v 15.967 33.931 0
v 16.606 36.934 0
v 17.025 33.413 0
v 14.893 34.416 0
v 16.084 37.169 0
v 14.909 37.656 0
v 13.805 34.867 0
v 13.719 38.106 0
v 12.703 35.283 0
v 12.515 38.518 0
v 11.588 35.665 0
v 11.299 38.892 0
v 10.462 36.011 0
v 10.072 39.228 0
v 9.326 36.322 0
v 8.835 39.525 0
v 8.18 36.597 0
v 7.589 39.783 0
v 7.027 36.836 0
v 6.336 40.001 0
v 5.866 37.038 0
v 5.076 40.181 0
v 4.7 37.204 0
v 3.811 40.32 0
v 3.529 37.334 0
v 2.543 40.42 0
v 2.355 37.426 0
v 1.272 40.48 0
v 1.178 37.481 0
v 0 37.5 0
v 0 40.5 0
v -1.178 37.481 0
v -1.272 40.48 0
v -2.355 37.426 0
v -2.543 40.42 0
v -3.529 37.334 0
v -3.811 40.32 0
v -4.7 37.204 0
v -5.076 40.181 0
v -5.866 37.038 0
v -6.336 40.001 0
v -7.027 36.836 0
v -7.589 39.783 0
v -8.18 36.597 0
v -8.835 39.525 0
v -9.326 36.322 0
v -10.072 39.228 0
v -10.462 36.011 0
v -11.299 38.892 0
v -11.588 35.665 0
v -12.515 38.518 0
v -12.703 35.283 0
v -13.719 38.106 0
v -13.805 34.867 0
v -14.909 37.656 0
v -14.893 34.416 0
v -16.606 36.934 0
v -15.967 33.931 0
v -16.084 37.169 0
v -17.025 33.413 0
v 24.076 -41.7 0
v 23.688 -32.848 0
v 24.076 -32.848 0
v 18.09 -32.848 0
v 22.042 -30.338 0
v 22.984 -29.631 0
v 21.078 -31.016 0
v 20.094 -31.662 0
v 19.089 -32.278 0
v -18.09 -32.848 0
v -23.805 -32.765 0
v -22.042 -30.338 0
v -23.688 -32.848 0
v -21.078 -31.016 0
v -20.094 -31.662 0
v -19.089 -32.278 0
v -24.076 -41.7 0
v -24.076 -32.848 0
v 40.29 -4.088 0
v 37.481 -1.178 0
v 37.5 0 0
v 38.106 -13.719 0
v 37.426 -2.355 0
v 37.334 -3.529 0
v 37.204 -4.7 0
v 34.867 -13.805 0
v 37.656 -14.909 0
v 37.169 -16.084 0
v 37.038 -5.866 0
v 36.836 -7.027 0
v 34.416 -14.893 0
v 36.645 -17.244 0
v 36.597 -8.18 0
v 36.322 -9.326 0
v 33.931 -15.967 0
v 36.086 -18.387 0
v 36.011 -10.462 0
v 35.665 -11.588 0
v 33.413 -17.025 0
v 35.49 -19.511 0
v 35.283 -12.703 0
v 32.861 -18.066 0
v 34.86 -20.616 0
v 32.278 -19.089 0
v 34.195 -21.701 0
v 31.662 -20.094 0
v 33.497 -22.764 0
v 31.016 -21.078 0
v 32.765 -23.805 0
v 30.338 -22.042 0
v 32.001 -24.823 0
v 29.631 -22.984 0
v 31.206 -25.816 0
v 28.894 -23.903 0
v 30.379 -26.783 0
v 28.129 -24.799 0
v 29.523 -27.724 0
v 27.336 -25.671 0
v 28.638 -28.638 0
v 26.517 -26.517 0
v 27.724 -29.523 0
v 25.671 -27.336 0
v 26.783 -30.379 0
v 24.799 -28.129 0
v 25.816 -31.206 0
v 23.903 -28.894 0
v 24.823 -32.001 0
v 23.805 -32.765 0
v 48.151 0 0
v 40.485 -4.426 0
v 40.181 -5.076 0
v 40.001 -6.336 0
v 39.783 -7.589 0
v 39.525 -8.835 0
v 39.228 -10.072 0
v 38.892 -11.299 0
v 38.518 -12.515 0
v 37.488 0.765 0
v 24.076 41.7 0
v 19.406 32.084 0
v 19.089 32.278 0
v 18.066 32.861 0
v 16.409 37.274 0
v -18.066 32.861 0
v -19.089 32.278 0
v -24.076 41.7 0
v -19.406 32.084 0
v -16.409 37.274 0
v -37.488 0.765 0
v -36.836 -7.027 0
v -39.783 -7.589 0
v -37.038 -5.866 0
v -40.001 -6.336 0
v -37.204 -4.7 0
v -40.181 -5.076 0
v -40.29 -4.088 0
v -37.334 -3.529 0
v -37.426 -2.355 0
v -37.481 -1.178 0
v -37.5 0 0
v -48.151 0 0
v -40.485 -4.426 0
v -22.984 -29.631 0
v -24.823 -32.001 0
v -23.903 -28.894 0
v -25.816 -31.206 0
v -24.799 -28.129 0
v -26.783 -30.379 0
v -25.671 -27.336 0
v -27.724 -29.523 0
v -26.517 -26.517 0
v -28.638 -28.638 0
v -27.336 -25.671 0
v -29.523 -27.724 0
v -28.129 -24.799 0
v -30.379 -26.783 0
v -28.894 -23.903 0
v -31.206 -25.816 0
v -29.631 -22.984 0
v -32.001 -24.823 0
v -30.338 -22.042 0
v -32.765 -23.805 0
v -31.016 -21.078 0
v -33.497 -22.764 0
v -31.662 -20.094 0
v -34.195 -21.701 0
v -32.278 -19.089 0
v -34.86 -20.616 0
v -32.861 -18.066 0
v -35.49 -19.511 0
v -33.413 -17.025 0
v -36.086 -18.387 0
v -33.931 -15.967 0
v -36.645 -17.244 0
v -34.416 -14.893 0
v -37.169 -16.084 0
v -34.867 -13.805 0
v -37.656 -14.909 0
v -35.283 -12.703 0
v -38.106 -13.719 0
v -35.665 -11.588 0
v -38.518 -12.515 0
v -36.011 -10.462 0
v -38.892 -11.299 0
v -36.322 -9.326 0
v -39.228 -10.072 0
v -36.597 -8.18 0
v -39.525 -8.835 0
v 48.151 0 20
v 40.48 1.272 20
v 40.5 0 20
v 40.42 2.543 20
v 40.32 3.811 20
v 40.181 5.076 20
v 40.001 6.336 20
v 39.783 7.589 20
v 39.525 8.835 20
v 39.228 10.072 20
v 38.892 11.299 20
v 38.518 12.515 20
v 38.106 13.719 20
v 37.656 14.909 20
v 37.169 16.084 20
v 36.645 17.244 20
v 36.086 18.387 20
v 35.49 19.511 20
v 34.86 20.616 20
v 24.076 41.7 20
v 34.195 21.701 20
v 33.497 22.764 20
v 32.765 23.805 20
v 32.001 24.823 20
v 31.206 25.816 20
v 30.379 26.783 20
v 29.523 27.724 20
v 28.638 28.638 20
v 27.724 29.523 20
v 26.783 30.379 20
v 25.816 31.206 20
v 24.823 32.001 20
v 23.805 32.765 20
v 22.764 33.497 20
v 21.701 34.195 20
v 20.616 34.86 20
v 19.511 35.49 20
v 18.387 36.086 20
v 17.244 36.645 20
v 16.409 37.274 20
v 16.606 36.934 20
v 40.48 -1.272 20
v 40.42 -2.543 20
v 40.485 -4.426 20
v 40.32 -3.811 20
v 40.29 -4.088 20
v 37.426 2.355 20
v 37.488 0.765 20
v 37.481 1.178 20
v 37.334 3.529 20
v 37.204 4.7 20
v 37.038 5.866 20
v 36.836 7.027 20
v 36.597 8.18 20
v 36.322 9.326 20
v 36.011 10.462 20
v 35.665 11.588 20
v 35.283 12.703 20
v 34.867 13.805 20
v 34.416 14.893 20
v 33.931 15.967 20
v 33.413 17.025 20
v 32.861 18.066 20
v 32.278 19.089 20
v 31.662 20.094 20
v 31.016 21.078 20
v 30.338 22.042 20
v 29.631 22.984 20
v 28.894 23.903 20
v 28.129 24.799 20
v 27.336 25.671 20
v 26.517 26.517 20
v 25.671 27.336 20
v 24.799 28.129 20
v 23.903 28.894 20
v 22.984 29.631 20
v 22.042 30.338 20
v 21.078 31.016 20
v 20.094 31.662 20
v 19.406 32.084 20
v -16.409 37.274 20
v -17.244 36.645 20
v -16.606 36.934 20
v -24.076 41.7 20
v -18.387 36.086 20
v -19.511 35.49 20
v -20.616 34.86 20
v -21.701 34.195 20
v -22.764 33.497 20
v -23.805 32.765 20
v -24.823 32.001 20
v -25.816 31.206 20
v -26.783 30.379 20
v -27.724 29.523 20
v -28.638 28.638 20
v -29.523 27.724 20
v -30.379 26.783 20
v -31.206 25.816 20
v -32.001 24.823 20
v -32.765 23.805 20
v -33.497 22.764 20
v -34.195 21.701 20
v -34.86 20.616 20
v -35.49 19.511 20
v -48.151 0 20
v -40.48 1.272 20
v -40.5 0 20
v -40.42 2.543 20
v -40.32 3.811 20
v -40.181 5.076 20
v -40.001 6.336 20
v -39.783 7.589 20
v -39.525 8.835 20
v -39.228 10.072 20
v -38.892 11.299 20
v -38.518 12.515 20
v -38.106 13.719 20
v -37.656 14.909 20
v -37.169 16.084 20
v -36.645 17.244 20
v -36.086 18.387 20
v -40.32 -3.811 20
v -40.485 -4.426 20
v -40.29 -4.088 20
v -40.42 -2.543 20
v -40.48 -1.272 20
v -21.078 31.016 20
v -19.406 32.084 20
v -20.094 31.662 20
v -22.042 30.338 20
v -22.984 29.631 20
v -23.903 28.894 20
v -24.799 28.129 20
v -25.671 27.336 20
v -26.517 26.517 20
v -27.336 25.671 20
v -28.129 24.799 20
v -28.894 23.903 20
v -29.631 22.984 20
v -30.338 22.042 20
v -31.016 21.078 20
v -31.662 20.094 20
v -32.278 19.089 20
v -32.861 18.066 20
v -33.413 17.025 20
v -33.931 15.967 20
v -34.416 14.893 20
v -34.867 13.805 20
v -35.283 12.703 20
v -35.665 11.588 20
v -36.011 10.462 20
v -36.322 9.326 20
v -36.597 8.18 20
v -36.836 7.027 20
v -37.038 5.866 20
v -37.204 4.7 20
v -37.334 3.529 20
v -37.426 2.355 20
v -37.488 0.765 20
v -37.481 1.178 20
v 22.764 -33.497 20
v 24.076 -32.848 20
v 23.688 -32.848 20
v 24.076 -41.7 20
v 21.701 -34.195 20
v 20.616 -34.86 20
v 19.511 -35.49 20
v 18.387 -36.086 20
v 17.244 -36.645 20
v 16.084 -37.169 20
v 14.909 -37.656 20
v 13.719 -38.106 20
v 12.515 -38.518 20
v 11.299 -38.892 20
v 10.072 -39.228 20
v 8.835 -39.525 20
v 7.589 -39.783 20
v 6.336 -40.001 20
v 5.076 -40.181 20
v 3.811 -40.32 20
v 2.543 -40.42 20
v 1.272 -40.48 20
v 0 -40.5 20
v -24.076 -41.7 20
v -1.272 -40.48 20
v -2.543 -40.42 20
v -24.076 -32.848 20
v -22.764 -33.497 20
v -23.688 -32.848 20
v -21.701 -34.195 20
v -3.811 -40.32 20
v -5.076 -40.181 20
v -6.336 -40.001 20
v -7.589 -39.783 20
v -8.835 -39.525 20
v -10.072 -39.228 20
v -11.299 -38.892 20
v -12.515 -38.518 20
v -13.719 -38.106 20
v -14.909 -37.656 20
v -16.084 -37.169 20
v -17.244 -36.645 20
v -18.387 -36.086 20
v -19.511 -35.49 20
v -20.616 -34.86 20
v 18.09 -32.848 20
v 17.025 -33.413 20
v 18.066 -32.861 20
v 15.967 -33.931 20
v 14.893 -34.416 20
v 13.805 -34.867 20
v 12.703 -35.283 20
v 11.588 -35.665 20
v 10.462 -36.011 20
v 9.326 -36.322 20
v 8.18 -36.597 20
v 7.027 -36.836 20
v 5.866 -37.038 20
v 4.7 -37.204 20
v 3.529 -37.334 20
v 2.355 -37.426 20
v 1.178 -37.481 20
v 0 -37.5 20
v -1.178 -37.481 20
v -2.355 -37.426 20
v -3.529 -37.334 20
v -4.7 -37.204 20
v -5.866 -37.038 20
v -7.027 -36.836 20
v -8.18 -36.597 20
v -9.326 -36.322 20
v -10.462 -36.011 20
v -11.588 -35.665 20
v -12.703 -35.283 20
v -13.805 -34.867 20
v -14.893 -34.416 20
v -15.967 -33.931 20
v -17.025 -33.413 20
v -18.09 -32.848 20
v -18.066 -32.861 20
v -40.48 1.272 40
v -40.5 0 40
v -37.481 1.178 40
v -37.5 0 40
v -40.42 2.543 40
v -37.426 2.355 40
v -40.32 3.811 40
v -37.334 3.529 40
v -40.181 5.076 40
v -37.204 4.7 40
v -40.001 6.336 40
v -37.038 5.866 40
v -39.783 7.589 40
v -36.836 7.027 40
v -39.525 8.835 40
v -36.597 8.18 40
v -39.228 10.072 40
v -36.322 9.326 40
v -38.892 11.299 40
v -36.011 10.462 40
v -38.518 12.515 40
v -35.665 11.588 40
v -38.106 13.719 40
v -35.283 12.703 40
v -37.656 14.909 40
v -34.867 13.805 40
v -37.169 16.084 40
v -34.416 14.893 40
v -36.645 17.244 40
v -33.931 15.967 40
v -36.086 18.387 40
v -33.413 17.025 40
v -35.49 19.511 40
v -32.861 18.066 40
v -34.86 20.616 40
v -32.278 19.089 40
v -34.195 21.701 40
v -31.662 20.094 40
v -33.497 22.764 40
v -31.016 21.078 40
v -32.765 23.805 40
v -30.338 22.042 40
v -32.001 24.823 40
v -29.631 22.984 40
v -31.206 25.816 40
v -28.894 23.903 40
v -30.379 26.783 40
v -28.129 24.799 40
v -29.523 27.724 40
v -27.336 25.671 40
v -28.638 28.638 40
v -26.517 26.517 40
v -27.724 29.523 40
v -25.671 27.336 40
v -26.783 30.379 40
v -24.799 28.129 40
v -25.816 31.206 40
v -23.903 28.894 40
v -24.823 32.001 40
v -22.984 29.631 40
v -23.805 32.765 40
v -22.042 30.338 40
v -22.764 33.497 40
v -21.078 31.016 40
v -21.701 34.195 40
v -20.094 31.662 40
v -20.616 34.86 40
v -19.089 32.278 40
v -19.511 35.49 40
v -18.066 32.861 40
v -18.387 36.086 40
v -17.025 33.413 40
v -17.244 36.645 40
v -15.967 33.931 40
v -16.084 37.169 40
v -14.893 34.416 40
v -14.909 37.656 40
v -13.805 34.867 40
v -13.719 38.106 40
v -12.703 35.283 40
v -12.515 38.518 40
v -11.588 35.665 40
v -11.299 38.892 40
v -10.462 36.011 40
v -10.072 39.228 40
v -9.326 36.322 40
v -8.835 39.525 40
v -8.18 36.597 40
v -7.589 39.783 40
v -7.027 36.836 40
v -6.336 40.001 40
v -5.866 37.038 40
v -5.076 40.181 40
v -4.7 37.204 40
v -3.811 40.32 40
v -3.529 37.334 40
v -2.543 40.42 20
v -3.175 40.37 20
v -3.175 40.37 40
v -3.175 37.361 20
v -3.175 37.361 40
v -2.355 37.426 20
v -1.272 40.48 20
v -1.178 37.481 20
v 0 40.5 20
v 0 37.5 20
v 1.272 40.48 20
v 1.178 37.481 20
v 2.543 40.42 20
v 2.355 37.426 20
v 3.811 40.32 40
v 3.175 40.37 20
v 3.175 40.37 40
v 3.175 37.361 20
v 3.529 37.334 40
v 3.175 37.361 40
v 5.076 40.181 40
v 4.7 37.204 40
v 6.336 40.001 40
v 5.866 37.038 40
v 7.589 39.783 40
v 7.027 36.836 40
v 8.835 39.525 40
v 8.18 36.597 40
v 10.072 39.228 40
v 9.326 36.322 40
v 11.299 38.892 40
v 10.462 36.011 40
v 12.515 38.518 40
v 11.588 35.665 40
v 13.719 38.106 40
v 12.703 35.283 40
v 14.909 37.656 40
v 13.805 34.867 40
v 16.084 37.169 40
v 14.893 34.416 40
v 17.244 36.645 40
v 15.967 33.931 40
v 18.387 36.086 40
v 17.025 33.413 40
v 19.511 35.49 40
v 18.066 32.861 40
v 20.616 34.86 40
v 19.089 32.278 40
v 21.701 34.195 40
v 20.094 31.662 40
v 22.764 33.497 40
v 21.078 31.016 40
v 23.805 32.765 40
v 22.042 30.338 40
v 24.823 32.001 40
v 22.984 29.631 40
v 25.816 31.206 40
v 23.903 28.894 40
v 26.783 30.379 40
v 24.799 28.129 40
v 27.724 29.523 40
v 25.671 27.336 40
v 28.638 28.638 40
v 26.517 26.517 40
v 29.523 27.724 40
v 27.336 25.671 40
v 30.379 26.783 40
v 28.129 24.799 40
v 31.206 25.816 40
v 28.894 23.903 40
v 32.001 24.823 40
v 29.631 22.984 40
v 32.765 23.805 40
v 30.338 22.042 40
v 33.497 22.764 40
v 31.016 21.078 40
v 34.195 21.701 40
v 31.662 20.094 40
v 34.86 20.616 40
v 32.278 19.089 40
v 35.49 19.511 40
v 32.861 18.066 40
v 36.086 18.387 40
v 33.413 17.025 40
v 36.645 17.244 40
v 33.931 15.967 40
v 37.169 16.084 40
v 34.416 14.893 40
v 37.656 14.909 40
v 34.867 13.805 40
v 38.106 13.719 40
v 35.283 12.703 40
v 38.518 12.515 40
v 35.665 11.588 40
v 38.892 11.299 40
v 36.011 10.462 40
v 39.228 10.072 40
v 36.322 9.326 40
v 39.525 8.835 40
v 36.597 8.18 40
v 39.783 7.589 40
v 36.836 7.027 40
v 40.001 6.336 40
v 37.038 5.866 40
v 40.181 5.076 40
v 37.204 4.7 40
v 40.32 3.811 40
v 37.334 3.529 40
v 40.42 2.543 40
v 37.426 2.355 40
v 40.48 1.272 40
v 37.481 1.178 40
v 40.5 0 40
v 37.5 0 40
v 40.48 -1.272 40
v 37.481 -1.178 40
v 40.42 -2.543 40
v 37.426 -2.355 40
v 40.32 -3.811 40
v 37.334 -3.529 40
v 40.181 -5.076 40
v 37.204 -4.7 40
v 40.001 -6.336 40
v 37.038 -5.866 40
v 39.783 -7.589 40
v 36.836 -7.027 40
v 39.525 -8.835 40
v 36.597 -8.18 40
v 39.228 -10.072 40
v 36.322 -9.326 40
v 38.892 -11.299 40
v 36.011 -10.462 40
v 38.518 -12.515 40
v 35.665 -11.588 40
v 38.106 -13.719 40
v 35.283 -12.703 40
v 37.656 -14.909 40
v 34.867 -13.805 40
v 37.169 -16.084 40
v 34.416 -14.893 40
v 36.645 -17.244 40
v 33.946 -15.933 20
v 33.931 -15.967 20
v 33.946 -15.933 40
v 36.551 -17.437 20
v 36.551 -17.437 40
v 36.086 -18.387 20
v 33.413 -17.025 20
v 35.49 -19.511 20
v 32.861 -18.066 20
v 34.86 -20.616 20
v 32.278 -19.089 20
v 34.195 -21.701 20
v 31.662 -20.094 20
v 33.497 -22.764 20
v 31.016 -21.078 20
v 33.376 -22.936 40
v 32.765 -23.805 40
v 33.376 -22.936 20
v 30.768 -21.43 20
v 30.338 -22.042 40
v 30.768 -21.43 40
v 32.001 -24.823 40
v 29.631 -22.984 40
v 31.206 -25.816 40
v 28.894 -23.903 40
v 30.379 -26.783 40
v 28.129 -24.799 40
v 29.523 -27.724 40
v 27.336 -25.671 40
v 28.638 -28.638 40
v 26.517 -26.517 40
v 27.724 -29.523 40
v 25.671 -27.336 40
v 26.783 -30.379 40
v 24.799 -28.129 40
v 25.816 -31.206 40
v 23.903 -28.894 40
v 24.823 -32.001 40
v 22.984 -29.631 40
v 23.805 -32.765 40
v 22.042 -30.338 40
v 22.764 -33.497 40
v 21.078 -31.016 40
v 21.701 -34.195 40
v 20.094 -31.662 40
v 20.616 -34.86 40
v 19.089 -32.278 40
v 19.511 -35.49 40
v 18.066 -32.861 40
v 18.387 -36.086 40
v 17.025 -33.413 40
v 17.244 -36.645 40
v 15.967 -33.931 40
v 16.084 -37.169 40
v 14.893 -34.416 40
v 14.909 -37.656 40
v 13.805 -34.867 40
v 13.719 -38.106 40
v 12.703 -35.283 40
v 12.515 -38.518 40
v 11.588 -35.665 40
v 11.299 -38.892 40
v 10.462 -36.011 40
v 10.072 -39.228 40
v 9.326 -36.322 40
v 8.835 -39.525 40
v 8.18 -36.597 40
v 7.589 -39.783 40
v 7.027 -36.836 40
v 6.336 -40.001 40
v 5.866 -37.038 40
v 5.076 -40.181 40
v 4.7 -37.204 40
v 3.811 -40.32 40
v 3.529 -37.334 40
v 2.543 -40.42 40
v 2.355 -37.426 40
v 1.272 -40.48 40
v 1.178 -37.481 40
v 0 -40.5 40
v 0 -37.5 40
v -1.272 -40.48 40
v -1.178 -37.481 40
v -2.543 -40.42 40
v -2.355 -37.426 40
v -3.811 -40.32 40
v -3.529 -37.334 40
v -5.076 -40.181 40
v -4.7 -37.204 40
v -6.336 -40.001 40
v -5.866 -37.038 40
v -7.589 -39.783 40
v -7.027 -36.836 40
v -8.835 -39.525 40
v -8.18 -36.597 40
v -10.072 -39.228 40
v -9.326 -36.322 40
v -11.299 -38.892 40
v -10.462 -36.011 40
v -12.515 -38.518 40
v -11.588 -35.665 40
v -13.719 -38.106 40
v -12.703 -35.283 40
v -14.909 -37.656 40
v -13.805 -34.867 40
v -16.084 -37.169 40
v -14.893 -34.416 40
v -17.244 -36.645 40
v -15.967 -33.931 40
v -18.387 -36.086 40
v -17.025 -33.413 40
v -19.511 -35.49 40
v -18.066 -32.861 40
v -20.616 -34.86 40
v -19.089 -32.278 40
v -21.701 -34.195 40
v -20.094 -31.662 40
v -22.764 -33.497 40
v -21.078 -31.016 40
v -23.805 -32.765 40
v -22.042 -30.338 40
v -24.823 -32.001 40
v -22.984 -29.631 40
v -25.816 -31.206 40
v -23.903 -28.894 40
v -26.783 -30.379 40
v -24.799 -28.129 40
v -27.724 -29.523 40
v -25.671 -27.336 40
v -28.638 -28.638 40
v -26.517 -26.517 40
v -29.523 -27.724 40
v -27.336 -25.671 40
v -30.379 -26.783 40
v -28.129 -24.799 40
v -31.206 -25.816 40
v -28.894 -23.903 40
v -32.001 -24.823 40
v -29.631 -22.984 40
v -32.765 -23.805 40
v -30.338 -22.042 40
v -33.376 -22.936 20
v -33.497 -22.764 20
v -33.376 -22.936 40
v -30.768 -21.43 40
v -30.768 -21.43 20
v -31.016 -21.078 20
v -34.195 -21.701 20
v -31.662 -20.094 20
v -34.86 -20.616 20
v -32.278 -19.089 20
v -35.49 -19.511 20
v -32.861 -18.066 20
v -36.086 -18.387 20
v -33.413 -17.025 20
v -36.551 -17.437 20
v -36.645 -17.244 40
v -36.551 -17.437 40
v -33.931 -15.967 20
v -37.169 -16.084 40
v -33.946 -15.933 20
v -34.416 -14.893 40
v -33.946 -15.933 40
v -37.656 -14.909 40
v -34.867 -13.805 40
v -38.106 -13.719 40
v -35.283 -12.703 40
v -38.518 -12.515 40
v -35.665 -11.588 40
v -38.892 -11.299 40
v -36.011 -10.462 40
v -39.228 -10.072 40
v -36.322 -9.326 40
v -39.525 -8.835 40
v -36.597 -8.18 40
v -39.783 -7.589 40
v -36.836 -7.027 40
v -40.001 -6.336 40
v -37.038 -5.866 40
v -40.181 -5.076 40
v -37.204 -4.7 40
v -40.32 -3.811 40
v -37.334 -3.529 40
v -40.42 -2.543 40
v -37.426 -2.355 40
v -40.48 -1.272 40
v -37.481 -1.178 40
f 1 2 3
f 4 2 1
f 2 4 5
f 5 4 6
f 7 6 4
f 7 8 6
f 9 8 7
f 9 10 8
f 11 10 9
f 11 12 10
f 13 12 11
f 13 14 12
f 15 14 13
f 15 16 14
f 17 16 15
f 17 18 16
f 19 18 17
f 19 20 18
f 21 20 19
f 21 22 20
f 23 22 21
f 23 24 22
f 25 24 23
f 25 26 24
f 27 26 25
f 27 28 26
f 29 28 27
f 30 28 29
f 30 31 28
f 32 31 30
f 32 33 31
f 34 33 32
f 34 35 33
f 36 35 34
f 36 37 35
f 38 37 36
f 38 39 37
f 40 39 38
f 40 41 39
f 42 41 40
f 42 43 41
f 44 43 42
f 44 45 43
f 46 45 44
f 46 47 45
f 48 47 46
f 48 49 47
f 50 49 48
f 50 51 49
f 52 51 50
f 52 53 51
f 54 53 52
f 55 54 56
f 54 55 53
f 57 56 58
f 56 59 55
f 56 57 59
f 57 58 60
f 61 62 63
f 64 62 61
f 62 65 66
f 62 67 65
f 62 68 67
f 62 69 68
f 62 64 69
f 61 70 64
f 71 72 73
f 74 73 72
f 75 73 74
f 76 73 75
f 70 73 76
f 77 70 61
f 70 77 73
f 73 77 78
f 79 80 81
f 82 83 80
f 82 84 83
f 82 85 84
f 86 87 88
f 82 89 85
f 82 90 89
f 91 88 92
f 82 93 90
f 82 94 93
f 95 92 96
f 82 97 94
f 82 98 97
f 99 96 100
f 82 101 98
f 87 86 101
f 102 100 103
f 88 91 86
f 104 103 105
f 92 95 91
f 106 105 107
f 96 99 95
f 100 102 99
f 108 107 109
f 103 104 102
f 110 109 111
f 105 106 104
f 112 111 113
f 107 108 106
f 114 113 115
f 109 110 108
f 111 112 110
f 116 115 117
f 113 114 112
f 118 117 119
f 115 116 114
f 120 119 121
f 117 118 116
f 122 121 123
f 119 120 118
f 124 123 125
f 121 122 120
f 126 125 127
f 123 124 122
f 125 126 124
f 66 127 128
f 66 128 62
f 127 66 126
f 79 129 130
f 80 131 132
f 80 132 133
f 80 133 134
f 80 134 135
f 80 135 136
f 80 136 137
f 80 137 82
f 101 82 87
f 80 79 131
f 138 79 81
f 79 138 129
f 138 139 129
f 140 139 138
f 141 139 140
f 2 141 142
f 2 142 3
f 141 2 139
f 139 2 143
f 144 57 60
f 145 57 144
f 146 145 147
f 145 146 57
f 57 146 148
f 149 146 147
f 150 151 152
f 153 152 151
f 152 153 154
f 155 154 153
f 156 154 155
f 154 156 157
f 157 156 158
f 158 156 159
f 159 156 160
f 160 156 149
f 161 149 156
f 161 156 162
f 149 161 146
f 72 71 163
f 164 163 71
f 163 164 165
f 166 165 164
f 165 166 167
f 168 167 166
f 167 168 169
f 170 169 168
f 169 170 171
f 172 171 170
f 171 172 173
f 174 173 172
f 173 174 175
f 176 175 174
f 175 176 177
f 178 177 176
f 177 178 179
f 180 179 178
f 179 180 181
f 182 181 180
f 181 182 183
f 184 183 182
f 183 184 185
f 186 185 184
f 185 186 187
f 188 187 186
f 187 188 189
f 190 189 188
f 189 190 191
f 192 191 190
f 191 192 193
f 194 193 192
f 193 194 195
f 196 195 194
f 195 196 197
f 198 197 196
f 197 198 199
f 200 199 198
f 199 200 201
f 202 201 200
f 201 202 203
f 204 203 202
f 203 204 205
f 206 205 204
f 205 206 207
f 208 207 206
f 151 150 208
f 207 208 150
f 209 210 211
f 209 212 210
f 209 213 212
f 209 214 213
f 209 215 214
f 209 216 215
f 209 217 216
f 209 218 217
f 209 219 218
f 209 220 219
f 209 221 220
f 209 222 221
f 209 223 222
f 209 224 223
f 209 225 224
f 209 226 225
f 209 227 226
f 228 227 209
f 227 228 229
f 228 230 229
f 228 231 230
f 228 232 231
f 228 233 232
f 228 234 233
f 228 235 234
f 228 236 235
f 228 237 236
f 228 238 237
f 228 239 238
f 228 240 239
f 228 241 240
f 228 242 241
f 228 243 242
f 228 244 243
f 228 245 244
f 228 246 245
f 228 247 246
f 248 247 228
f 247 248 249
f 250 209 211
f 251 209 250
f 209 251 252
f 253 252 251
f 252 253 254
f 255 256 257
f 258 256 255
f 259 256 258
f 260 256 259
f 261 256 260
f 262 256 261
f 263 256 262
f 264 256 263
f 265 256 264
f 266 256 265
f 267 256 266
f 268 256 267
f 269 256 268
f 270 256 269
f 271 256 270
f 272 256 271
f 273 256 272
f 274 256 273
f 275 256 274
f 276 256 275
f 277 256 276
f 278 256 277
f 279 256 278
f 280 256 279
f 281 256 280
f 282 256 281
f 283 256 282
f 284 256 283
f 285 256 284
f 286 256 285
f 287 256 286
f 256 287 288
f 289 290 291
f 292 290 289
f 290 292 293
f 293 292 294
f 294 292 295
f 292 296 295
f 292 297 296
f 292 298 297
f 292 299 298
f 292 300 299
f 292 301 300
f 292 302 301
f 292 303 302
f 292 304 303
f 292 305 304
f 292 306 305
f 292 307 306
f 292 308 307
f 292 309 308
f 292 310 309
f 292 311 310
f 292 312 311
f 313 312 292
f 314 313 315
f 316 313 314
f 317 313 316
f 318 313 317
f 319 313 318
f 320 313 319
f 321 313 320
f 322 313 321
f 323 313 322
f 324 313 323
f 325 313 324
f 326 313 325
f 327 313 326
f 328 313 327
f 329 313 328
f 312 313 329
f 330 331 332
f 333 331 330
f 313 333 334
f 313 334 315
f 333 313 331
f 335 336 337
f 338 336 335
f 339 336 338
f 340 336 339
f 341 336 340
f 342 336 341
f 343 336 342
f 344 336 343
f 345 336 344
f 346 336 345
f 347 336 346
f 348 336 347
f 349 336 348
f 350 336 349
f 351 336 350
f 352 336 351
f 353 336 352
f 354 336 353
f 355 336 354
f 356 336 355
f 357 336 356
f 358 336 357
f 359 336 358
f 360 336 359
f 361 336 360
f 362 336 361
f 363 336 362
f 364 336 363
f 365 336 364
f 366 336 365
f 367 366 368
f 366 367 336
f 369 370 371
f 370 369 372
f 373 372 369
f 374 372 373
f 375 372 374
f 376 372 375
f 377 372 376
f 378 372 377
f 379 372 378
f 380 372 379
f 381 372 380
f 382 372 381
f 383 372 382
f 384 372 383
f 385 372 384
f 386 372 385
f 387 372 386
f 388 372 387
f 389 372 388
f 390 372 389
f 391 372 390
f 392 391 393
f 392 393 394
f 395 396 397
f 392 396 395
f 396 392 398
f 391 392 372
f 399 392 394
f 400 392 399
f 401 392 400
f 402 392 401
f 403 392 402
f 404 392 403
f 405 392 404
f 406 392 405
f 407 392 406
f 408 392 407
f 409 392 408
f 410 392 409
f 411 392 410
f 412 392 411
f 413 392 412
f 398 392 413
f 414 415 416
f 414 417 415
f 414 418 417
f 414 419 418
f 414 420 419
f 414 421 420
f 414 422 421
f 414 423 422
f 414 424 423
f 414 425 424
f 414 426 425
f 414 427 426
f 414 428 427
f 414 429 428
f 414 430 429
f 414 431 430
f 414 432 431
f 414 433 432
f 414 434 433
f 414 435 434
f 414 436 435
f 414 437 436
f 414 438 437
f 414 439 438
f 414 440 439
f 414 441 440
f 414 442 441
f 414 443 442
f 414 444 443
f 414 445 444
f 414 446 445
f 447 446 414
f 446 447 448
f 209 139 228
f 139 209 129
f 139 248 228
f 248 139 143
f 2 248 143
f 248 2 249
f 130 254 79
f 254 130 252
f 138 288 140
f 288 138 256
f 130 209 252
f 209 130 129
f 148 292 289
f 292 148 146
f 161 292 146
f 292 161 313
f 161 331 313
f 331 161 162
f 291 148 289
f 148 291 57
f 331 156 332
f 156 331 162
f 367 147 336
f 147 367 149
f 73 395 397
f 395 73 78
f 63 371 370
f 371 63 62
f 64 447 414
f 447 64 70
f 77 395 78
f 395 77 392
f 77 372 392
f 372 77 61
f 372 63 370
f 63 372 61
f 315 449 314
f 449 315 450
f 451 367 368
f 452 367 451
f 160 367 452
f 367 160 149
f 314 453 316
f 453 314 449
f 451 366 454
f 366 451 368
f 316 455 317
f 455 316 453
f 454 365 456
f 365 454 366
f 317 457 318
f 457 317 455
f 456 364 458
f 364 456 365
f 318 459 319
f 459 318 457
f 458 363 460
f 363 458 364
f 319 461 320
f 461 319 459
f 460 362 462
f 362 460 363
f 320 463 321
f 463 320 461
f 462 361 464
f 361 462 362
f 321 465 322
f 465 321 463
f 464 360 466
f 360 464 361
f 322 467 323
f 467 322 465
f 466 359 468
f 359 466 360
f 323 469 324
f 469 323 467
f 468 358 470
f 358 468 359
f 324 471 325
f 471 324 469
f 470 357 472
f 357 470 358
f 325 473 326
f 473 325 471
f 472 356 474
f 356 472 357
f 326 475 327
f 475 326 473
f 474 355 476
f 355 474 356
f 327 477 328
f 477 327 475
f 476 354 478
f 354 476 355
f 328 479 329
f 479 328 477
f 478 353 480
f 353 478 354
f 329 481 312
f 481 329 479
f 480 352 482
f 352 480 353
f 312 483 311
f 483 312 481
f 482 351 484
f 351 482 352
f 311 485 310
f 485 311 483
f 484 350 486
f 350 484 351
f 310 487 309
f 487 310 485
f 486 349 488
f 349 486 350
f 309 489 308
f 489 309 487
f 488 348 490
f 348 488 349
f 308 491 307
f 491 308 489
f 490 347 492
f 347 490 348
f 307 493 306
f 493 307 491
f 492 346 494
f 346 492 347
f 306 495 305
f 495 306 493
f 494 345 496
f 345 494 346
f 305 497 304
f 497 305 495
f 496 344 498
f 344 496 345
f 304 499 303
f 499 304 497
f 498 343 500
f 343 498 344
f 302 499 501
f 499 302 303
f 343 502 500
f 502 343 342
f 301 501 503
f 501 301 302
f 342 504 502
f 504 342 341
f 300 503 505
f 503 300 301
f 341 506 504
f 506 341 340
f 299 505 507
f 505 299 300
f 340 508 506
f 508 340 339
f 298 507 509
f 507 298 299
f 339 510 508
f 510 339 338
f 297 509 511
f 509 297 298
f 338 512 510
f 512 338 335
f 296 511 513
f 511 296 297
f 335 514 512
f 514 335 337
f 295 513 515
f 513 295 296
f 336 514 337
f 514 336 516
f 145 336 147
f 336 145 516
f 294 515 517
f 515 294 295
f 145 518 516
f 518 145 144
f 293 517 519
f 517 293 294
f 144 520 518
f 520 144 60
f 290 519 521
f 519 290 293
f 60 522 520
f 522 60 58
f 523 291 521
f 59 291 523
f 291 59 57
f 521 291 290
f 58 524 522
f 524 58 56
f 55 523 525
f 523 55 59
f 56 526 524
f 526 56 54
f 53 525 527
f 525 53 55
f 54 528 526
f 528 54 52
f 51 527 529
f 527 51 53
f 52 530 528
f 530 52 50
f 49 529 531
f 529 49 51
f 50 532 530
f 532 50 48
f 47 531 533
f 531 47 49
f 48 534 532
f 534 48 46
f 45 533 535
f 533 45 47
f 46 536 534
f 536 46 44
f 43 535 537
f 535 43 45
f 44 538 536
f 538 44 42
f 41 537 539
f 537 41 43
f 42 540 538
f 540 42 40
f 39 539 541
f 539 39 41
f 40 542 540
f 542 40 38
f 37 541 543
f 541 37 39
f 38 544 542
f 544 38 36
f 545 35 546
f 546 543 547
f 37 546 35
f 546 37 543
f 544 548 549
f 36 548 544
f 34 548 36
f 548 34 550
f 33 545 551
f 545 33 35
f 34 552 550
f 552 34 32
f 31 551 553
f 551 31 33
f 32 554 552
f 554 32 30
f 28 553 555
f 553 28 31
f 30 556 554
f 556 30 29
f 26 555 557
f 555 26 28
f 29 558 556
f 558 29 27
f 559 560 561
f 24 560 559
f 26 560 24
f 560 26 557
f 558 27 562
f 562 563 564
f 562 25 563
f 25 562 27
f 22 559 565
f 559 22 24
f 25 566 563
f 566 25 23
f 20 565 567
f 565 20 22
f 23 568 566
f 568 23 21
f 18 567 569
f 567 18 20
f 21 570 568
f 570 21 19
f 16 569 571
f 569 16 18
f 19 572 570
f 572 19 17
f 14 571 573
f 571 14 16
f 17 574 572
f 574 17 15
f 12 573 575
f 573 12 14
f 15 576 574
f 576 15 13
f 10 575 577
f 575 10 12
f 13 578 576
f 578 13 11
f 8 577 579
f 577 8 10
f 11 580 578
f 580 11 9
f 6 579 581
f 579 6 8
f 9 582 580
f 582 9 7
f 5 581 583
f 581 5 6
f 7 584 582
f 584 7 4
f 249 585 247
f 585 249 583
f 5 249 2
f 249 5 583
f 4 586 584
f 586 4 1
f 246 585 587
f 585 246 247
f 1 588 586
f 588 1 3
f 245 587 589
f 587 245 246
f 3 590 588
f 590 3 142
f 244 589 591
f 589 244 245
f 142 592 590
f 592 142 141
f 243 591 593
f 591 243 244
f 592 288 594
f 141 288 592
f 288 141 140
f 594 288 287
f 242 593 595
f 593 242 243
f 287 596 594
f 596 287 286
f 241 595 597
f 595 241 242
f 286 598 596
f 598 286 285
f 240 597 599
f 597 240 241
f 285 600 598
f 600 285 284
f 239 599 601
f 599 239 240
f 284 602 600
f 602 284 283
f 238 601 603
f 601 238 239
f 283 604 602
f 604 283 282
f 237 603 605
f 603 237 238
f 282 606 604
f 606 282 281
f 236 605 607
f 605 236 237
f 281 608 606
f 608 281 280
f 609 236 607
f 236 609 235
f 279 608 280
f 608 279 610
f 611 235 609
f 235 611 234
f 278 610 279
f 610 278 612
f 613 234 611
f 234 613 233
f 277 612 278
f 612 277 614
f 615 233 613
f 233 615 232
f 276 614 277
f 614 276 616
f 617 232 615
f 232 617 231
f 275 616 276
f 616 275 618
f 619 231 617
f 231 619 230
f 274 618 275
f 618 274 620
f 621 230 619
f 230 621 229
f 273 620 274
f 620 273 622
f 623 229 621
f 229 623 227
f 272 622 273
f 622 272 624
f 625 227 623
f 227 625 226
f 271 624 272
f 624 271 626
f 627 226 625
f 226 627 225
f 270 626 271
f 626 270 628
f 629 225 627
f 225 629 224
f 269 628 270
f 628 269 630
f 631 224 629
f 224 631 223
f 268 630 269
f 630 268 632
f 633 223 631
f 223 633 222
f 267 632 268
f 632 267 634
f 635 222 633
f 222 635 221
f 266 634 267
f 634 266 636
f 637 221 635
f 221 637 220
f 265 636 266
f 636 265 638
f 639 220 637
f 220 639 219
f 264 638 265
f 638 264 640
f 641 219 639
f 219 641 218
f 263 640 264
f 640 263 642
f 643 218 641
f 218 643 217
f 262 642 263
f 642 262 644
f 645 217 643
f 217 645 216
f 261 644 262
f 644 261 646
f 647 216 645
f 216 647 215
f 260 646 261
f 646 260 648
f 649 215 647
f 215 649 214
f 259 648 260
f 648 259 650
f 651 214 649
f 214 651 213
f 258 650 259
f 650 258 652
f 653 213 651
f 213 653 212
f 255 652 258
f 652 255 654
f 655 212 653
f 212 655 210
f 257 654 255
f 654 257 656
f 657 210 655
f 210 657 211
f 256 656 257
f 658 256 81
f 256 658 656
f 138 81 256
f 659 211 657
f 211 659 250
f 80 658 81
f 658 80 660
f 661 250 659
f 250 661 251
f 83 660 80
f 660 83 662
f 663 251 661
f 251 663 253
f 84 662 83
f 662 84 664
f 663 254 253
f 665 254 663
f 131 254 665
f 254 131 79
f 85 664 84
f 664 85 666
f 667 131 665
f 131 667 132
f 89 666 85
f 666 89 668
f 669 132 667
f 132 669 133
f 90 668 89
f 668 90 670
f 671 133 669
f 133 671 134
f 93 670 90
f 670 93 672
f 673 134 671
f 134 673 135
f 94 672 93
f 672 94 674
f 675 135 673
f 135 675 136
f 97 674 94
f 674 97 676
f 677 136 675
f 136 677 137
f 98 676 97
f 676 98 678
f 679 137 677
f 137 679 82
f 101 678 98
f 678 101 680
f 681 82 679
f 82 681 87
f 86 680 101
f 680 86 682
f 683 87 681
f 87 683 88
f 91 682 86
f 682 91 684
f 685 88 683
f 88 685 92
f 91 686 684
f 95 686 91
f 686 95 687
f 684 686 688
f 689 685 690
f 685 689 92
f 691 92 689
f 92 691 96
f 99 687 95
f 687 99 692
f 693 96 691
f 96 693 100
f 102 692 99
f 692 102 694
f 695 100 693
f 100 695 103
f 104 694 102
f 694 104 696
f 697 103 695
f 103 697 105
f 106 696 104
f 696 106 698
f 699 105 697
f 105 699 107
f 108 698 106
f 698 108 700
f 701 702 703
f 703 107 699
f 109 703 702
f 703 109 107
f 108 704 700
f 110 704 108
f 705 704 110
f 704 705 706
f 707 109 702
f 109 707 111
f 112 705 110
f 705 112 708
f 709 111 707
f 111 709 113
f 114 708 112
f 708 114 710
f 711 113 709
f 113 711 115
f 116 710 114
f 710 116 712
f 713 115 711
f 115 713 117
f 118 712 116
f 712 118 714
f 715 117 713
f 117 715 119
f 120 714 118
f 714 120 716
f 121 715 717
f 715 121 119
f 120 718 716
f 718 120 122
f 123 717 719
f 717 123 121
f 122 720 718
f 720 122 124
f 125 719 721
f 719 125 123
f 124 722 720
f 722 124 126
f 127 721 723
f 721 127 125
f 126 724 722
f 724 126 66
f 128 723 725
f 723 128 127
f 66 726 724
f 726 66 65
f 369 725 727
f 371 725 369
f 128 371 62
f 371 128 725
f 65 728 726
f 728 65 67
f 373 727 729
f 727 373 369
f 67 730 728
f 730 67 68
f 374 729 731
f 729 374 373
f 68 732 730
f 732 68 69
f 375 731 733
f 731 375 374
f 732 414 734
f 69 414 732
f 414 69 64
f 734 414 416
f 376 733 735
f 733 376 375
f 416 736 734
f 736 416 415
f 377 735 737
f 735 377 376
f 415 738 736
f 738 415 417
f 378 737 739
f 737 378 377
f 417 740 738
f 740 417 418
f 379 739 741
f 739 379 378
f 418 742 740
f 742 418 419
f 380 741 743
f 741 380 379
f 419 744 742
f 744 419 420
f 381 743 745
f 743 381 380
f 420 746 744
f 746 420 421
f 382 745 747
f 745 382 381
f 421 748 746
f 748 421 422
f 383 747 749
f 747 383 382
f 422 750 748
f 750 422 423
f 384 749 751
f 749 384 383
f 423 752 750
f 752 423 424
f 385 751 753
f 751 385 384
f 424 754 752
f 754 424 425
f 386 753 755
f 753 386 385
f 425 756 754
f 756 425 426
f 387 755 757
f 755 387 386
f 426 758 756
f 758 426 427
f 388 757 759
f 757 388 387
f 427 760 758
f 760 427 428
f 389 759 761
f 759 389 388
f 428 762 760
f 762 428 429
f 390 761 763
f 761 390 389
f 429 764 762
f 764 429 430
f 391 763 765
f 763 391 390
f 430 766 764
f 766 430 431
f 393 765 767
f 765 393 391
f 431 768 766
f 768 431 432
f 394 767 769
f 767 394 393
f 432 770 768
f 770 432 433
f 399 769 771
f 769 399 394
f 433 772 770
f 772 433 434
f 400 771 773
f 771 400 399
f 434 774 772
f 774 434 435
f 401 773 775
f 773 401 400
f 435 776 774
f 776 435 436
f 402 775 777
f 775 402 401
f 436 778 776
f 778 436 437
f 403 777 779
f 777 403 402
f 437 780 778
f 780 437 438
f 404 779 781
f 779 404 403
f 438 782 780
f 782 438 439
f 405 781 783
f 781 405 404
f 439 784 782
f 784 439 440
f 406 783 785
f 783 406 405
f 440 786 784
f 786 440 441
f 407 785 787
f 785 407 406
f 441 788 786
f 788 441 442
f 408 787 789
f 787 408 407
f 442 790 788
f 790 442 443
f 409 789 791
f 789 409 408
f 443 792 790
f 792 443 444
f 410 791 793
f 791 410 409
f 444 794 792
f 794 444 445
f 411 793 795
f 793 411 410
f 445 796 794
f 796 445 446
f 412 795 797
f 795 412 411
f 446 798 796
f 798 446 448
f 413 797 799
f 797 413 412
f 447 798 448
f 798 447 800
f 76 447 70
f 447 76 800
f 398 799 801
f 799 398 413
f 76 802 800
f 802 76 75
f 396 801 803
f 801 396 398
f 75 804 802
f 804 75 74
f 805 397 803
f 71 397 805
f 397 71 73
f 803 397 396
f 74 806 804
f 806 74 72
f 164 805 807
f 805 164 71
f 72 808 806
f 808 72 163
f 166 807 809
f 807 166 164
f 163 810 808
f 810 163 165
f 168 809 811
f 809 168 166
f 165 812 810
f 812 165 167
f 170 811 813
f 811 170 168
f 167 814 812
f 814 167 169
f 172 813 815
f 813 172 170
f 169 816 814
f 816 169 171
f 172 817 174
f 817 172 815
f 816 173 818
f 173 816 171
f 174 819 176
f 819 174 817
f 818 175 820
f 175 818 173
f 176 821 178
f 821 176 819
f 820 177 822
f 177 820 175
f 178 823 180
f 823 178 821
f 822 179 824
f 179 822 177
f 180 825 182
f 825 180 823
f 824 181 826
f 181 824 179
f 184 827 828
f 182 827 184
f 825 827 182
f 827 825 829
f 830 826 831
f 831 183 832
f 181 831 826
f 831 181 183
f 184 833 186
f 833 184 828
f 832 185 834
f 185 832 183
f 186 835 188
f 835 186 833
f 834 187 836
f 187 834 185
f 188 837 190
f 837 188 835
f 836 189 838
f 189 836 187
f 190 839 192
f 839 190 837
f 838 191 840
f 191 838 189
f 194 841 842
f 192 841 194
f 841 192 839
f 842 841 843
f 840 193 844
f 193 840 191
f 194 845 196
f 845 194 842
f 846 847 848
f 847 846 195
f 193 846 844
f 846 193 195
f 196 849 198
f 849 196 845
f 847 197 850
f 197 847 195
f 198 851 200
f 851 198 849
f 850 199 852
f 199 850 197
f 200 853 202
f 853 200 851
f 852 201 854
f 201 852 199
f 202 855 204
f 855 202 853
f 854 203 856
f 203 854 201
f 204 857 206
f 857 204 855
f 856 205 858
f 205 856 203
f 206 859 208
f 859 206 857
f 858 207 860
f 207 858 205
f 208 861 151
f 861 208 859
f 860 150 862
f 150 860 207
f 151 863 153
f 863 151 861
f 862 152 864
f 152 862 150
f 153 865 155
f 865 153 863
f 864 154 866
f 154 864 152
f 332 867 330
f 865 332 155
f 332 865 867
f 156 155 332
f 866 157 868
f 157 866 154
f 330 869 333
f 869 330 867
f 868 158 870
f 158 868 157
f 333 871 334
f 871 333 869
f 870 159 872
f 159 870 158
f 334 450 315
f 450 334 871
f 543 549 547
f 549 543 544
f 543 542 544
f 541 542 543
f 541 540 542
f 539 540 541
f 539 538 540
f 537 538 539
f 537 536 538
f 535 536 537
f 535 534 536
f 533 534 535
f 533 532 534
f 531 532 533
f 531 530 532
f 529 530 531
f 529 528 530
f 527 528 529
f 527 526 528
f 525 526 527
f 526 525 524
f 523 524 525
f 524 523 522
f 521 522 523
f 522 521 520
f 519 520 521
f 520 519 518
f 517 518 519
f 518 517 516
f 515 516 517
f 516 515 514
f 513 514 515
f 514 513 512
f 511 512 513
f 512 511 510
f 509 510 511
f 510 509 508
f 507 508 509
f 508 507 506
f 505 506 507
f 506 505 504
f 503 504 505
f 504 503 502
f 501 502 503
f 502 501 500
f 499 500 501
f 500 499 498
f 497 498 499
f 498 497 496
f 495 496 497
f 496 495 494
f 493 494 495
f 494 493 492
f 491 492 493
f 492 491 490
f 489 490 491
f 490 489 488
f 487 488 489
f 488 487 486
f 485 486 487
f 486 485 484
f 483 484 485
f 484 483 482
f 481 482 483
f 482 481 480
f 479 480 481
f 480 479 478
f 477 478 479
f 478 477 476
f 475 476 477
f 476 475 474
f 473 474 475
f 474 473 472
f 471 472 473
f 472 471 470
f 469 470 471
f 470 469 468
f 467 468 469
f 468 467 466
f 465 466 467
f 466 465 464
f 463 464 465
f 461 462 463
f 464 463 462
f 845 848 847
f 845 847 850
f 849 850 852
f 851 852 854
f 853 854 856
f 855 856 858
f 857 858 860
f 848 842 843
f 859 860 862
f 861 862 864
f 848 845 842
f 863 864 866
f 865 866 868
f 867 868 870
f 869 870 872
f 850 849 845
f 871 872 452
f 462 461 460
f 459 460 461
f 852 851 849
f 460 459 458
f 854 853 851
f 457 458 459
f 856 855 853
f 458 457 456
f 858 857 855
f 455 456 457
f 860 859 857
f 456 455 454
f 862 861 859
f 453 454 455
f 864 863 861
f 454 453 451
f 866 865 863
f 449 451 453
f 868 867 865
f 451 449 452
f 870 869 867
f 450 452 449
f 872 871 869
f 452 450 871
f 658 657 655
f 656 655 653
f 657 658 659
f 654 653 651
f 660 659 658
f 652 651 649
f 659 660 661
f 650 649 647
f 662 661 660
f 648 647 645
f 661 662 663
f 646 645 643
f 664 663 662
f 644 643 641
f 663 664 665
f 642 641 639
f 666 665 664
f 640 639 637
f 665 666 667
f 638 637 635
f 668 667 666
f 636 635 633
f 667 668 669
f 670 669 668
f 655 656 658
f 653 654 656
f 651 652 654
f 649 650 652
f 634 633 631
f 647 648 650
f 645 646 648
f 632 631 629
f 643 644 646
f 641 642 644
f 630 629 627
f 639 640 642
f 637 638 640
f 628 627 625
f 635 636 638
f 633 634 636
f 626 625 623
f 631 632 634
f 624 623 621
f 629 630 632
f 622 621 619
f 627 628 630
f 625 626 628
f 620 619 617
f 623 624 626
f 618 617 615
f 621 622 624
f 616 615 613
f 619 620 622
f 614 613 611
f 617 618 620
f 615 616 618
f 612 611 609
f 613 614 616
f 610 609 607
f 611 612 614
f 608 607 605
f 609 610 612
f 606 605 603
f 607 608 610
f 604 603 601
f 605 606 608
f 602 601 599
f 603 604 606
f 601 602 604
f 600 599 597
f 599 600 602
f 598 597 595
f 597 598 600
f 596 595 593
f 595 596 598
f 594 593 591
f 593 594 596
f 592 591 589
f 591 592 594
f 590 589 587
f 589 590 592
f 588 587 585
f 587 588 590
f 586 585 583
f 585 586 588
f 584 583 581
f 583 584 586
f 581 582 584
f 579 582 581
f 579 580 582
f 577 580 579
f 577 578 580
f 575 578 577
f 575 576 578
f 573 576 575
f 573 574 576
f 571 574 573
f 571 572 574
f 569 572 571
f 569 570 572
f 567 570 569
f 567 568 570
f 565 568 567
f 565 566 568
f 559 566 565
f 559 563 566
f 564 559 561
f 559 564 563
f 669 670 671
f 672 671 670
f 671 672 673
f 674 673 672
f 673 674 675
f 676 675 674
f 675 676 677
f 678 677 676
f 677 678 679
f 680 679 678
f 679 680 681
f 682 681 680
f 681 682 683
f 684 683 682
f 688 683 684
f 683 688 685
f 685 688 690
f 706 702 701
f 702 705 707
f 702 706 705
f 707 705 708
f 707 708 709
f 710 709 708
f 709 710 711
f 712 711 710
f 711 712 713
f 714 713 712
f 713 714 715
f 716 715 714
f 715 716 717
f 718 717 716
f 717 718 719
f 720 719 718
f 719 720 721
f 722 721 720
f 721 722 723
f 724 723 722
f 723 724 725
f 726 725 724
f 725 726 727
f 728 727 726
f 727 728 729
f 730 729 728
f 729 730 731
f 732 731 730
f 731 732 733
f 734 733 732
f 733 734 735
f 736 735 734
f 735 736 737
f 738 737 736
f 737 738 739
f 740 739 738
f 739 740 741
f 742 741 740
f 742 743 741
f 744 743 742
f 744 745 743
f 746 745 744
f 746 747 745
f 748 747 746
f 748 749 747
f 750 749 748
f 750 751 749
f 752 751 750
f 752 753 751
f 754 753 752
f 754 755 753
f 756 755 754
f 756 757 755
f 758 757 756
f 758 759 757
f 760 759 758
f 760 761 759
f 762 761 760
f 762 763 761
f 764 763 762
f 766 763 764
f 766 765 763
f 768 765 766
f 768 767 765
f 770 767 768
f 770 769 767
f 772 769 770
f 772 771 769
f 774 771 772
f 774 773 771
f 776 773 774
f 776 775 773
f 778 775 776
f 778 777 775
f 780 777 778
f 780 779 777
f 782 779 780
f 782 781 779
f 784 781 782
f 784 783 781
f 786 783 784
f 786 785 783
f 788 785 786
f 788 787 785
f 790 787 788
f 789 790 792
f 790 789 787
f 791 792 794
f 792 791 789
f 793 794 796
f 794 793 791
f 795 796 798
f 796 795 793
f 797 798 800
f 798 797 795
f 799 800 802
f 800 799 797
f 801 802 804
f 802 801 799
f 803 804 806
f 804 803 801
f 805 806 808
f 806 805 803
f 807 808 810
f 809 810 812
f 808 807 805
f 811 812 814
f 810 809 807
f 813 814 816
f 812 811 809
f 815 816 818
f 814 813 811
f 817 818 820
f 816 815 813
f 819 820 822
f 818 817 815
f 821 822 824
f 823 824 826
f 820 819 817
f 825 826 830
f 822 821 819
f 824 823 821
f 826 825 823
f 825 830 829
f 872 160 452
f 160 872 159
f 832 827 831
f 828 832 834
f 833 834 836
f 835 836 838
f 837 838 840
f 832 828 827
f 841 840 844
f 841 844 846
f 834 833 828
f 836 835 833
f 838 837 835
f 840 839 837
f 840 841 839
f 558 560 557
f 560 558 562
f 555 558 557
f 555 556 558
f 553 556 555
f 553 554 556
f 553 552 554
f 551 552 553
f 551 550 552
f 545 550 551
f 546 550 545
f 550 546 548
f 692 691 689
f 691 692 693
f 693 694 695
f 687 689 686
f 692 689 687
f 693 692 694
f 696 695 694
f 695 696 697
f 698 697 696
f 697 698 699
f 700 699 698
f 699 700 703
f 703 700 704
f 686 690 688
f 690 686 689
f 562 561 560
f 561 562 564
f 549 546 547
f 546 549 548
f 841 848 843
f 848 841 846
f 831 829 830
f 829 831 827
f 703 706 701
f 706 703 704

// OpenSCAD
// file: RocketCouplers.scad
bt20id = 18.0;  // Motors ABC
bt50id = 24.1;  // Motors DE
bt52hid = 29.0; // Motors EFG
bt55id = 32.6;
bt60id = 40.6;
bt70id = 55.2;
bt80id = 65.0;

bt20od = 18.7;
bt50od = 24.8;
bt52hod = 31.0;
bt55od = 33.7;
bt60od = 41.7;
bt70od = 56.3;
bt80od = 66.0;

module hollowCylinderAsBase(r,wall,h)
{
    pts = [
        [r-wall,h],
        [r,h],
        [r,1],
        [r-1,0],
        [r-wall,0]];
    rotate_extrude()
    polygon(pts,convexity=2);
}

module hollowCylinderWithDrop(r,wall,h)
{
    pts = [
        [r-wall,h],
        [r,h],
        [r,0],
        [r-wall/2,-wall/2],
        [r-wall,0]];
    rotate_extrude()
    polygon(pts,convexity=2);
}

module hollowConeWithDrop(r1,r2,wall,h)
{
    pts = [
    [r2-wall,h],
    [r2,h],
    [r1,0],
    [r1-wall/2,-wall/2],
    [r1-wall,0]];
    rotate_extrude()
    polygon(pts,convexity=2);
}

module hollowConeWithDropAndHole(r1,r2,wall,h)
{
    pts = [
    [r2-wall,h],
    [r2,h],
    [r1,0],
    [r1-wall/2,-wall/2],
    [r1-wall,0]];
    difference()
    {
        rotate_extrude()
        polygon(pts,convexity=2);
        translate([(r1+r2-wall)/2.0,0])
        cylinder(r=wall/1.5,h);
    }
}

// This is a spherical cap that has a slope of -1 at its edge.

module capWithDrop(r)
{
    rho = 1.414*r;
    translate([0,0,-r])
    intersection()
    {
        sphere(rho,$fn=50);
        cylinder(r1=0,r2=2*rho,h=2*rho);
        translate([-2*rho,-2*rho,r-1])
        cube(4*rho);
    }    
}

//capWithDrop(10);

/*
wall = 3;
h1 = 10;
h2 = 25;
h3 = 10;
hollowCylinderAsBase(bt55id/2,wall,h1);
translate([0,0,h1])
hollowConeWithDropAndHole(bt55od/2,bt70od/2,wall,h2);
translate([0,0,h1+h2])
hollowCylinderWithDrop(bt70id/2,wall,h3);
*/
// main file
$fn = 200;
inch = 25.4;

include <RocketCouplers.scad>

wall = 3;
baseHeight = 20;

bt60adj = 0.1;
rOut = bt60od;
rIn = bt60id - bt60adj;

width = 2*rOut/sqrt(3);
h = rOut*(1-sqrt(2/3)) + (rOut-rIn);

echo(width, rOut, h);

yBottom = sqrt(3)*width/2 - 2* rOut;

difference()
{
    union()
    {
        linear_extrude(baseHeight)
        {
            for (angle=[0,120,240])
            {
                rotate(angle)
                translate([-width/2,yBottom])
                square([width,h]);
            }
        }

        rotate_extrude()
        translate([rIn-wall,0])
        square([wall,2*baseHeight]);
    }   
    translate([0,0,baseHeight])
    linear_extrude(2*baseHeight)
    {
        for (angle=[0,120,240])
        {
            rotate(angle)
            translate([-0.125*inch,0])
            square([0.25*inch,2*rOut]);
        }
    }
}
